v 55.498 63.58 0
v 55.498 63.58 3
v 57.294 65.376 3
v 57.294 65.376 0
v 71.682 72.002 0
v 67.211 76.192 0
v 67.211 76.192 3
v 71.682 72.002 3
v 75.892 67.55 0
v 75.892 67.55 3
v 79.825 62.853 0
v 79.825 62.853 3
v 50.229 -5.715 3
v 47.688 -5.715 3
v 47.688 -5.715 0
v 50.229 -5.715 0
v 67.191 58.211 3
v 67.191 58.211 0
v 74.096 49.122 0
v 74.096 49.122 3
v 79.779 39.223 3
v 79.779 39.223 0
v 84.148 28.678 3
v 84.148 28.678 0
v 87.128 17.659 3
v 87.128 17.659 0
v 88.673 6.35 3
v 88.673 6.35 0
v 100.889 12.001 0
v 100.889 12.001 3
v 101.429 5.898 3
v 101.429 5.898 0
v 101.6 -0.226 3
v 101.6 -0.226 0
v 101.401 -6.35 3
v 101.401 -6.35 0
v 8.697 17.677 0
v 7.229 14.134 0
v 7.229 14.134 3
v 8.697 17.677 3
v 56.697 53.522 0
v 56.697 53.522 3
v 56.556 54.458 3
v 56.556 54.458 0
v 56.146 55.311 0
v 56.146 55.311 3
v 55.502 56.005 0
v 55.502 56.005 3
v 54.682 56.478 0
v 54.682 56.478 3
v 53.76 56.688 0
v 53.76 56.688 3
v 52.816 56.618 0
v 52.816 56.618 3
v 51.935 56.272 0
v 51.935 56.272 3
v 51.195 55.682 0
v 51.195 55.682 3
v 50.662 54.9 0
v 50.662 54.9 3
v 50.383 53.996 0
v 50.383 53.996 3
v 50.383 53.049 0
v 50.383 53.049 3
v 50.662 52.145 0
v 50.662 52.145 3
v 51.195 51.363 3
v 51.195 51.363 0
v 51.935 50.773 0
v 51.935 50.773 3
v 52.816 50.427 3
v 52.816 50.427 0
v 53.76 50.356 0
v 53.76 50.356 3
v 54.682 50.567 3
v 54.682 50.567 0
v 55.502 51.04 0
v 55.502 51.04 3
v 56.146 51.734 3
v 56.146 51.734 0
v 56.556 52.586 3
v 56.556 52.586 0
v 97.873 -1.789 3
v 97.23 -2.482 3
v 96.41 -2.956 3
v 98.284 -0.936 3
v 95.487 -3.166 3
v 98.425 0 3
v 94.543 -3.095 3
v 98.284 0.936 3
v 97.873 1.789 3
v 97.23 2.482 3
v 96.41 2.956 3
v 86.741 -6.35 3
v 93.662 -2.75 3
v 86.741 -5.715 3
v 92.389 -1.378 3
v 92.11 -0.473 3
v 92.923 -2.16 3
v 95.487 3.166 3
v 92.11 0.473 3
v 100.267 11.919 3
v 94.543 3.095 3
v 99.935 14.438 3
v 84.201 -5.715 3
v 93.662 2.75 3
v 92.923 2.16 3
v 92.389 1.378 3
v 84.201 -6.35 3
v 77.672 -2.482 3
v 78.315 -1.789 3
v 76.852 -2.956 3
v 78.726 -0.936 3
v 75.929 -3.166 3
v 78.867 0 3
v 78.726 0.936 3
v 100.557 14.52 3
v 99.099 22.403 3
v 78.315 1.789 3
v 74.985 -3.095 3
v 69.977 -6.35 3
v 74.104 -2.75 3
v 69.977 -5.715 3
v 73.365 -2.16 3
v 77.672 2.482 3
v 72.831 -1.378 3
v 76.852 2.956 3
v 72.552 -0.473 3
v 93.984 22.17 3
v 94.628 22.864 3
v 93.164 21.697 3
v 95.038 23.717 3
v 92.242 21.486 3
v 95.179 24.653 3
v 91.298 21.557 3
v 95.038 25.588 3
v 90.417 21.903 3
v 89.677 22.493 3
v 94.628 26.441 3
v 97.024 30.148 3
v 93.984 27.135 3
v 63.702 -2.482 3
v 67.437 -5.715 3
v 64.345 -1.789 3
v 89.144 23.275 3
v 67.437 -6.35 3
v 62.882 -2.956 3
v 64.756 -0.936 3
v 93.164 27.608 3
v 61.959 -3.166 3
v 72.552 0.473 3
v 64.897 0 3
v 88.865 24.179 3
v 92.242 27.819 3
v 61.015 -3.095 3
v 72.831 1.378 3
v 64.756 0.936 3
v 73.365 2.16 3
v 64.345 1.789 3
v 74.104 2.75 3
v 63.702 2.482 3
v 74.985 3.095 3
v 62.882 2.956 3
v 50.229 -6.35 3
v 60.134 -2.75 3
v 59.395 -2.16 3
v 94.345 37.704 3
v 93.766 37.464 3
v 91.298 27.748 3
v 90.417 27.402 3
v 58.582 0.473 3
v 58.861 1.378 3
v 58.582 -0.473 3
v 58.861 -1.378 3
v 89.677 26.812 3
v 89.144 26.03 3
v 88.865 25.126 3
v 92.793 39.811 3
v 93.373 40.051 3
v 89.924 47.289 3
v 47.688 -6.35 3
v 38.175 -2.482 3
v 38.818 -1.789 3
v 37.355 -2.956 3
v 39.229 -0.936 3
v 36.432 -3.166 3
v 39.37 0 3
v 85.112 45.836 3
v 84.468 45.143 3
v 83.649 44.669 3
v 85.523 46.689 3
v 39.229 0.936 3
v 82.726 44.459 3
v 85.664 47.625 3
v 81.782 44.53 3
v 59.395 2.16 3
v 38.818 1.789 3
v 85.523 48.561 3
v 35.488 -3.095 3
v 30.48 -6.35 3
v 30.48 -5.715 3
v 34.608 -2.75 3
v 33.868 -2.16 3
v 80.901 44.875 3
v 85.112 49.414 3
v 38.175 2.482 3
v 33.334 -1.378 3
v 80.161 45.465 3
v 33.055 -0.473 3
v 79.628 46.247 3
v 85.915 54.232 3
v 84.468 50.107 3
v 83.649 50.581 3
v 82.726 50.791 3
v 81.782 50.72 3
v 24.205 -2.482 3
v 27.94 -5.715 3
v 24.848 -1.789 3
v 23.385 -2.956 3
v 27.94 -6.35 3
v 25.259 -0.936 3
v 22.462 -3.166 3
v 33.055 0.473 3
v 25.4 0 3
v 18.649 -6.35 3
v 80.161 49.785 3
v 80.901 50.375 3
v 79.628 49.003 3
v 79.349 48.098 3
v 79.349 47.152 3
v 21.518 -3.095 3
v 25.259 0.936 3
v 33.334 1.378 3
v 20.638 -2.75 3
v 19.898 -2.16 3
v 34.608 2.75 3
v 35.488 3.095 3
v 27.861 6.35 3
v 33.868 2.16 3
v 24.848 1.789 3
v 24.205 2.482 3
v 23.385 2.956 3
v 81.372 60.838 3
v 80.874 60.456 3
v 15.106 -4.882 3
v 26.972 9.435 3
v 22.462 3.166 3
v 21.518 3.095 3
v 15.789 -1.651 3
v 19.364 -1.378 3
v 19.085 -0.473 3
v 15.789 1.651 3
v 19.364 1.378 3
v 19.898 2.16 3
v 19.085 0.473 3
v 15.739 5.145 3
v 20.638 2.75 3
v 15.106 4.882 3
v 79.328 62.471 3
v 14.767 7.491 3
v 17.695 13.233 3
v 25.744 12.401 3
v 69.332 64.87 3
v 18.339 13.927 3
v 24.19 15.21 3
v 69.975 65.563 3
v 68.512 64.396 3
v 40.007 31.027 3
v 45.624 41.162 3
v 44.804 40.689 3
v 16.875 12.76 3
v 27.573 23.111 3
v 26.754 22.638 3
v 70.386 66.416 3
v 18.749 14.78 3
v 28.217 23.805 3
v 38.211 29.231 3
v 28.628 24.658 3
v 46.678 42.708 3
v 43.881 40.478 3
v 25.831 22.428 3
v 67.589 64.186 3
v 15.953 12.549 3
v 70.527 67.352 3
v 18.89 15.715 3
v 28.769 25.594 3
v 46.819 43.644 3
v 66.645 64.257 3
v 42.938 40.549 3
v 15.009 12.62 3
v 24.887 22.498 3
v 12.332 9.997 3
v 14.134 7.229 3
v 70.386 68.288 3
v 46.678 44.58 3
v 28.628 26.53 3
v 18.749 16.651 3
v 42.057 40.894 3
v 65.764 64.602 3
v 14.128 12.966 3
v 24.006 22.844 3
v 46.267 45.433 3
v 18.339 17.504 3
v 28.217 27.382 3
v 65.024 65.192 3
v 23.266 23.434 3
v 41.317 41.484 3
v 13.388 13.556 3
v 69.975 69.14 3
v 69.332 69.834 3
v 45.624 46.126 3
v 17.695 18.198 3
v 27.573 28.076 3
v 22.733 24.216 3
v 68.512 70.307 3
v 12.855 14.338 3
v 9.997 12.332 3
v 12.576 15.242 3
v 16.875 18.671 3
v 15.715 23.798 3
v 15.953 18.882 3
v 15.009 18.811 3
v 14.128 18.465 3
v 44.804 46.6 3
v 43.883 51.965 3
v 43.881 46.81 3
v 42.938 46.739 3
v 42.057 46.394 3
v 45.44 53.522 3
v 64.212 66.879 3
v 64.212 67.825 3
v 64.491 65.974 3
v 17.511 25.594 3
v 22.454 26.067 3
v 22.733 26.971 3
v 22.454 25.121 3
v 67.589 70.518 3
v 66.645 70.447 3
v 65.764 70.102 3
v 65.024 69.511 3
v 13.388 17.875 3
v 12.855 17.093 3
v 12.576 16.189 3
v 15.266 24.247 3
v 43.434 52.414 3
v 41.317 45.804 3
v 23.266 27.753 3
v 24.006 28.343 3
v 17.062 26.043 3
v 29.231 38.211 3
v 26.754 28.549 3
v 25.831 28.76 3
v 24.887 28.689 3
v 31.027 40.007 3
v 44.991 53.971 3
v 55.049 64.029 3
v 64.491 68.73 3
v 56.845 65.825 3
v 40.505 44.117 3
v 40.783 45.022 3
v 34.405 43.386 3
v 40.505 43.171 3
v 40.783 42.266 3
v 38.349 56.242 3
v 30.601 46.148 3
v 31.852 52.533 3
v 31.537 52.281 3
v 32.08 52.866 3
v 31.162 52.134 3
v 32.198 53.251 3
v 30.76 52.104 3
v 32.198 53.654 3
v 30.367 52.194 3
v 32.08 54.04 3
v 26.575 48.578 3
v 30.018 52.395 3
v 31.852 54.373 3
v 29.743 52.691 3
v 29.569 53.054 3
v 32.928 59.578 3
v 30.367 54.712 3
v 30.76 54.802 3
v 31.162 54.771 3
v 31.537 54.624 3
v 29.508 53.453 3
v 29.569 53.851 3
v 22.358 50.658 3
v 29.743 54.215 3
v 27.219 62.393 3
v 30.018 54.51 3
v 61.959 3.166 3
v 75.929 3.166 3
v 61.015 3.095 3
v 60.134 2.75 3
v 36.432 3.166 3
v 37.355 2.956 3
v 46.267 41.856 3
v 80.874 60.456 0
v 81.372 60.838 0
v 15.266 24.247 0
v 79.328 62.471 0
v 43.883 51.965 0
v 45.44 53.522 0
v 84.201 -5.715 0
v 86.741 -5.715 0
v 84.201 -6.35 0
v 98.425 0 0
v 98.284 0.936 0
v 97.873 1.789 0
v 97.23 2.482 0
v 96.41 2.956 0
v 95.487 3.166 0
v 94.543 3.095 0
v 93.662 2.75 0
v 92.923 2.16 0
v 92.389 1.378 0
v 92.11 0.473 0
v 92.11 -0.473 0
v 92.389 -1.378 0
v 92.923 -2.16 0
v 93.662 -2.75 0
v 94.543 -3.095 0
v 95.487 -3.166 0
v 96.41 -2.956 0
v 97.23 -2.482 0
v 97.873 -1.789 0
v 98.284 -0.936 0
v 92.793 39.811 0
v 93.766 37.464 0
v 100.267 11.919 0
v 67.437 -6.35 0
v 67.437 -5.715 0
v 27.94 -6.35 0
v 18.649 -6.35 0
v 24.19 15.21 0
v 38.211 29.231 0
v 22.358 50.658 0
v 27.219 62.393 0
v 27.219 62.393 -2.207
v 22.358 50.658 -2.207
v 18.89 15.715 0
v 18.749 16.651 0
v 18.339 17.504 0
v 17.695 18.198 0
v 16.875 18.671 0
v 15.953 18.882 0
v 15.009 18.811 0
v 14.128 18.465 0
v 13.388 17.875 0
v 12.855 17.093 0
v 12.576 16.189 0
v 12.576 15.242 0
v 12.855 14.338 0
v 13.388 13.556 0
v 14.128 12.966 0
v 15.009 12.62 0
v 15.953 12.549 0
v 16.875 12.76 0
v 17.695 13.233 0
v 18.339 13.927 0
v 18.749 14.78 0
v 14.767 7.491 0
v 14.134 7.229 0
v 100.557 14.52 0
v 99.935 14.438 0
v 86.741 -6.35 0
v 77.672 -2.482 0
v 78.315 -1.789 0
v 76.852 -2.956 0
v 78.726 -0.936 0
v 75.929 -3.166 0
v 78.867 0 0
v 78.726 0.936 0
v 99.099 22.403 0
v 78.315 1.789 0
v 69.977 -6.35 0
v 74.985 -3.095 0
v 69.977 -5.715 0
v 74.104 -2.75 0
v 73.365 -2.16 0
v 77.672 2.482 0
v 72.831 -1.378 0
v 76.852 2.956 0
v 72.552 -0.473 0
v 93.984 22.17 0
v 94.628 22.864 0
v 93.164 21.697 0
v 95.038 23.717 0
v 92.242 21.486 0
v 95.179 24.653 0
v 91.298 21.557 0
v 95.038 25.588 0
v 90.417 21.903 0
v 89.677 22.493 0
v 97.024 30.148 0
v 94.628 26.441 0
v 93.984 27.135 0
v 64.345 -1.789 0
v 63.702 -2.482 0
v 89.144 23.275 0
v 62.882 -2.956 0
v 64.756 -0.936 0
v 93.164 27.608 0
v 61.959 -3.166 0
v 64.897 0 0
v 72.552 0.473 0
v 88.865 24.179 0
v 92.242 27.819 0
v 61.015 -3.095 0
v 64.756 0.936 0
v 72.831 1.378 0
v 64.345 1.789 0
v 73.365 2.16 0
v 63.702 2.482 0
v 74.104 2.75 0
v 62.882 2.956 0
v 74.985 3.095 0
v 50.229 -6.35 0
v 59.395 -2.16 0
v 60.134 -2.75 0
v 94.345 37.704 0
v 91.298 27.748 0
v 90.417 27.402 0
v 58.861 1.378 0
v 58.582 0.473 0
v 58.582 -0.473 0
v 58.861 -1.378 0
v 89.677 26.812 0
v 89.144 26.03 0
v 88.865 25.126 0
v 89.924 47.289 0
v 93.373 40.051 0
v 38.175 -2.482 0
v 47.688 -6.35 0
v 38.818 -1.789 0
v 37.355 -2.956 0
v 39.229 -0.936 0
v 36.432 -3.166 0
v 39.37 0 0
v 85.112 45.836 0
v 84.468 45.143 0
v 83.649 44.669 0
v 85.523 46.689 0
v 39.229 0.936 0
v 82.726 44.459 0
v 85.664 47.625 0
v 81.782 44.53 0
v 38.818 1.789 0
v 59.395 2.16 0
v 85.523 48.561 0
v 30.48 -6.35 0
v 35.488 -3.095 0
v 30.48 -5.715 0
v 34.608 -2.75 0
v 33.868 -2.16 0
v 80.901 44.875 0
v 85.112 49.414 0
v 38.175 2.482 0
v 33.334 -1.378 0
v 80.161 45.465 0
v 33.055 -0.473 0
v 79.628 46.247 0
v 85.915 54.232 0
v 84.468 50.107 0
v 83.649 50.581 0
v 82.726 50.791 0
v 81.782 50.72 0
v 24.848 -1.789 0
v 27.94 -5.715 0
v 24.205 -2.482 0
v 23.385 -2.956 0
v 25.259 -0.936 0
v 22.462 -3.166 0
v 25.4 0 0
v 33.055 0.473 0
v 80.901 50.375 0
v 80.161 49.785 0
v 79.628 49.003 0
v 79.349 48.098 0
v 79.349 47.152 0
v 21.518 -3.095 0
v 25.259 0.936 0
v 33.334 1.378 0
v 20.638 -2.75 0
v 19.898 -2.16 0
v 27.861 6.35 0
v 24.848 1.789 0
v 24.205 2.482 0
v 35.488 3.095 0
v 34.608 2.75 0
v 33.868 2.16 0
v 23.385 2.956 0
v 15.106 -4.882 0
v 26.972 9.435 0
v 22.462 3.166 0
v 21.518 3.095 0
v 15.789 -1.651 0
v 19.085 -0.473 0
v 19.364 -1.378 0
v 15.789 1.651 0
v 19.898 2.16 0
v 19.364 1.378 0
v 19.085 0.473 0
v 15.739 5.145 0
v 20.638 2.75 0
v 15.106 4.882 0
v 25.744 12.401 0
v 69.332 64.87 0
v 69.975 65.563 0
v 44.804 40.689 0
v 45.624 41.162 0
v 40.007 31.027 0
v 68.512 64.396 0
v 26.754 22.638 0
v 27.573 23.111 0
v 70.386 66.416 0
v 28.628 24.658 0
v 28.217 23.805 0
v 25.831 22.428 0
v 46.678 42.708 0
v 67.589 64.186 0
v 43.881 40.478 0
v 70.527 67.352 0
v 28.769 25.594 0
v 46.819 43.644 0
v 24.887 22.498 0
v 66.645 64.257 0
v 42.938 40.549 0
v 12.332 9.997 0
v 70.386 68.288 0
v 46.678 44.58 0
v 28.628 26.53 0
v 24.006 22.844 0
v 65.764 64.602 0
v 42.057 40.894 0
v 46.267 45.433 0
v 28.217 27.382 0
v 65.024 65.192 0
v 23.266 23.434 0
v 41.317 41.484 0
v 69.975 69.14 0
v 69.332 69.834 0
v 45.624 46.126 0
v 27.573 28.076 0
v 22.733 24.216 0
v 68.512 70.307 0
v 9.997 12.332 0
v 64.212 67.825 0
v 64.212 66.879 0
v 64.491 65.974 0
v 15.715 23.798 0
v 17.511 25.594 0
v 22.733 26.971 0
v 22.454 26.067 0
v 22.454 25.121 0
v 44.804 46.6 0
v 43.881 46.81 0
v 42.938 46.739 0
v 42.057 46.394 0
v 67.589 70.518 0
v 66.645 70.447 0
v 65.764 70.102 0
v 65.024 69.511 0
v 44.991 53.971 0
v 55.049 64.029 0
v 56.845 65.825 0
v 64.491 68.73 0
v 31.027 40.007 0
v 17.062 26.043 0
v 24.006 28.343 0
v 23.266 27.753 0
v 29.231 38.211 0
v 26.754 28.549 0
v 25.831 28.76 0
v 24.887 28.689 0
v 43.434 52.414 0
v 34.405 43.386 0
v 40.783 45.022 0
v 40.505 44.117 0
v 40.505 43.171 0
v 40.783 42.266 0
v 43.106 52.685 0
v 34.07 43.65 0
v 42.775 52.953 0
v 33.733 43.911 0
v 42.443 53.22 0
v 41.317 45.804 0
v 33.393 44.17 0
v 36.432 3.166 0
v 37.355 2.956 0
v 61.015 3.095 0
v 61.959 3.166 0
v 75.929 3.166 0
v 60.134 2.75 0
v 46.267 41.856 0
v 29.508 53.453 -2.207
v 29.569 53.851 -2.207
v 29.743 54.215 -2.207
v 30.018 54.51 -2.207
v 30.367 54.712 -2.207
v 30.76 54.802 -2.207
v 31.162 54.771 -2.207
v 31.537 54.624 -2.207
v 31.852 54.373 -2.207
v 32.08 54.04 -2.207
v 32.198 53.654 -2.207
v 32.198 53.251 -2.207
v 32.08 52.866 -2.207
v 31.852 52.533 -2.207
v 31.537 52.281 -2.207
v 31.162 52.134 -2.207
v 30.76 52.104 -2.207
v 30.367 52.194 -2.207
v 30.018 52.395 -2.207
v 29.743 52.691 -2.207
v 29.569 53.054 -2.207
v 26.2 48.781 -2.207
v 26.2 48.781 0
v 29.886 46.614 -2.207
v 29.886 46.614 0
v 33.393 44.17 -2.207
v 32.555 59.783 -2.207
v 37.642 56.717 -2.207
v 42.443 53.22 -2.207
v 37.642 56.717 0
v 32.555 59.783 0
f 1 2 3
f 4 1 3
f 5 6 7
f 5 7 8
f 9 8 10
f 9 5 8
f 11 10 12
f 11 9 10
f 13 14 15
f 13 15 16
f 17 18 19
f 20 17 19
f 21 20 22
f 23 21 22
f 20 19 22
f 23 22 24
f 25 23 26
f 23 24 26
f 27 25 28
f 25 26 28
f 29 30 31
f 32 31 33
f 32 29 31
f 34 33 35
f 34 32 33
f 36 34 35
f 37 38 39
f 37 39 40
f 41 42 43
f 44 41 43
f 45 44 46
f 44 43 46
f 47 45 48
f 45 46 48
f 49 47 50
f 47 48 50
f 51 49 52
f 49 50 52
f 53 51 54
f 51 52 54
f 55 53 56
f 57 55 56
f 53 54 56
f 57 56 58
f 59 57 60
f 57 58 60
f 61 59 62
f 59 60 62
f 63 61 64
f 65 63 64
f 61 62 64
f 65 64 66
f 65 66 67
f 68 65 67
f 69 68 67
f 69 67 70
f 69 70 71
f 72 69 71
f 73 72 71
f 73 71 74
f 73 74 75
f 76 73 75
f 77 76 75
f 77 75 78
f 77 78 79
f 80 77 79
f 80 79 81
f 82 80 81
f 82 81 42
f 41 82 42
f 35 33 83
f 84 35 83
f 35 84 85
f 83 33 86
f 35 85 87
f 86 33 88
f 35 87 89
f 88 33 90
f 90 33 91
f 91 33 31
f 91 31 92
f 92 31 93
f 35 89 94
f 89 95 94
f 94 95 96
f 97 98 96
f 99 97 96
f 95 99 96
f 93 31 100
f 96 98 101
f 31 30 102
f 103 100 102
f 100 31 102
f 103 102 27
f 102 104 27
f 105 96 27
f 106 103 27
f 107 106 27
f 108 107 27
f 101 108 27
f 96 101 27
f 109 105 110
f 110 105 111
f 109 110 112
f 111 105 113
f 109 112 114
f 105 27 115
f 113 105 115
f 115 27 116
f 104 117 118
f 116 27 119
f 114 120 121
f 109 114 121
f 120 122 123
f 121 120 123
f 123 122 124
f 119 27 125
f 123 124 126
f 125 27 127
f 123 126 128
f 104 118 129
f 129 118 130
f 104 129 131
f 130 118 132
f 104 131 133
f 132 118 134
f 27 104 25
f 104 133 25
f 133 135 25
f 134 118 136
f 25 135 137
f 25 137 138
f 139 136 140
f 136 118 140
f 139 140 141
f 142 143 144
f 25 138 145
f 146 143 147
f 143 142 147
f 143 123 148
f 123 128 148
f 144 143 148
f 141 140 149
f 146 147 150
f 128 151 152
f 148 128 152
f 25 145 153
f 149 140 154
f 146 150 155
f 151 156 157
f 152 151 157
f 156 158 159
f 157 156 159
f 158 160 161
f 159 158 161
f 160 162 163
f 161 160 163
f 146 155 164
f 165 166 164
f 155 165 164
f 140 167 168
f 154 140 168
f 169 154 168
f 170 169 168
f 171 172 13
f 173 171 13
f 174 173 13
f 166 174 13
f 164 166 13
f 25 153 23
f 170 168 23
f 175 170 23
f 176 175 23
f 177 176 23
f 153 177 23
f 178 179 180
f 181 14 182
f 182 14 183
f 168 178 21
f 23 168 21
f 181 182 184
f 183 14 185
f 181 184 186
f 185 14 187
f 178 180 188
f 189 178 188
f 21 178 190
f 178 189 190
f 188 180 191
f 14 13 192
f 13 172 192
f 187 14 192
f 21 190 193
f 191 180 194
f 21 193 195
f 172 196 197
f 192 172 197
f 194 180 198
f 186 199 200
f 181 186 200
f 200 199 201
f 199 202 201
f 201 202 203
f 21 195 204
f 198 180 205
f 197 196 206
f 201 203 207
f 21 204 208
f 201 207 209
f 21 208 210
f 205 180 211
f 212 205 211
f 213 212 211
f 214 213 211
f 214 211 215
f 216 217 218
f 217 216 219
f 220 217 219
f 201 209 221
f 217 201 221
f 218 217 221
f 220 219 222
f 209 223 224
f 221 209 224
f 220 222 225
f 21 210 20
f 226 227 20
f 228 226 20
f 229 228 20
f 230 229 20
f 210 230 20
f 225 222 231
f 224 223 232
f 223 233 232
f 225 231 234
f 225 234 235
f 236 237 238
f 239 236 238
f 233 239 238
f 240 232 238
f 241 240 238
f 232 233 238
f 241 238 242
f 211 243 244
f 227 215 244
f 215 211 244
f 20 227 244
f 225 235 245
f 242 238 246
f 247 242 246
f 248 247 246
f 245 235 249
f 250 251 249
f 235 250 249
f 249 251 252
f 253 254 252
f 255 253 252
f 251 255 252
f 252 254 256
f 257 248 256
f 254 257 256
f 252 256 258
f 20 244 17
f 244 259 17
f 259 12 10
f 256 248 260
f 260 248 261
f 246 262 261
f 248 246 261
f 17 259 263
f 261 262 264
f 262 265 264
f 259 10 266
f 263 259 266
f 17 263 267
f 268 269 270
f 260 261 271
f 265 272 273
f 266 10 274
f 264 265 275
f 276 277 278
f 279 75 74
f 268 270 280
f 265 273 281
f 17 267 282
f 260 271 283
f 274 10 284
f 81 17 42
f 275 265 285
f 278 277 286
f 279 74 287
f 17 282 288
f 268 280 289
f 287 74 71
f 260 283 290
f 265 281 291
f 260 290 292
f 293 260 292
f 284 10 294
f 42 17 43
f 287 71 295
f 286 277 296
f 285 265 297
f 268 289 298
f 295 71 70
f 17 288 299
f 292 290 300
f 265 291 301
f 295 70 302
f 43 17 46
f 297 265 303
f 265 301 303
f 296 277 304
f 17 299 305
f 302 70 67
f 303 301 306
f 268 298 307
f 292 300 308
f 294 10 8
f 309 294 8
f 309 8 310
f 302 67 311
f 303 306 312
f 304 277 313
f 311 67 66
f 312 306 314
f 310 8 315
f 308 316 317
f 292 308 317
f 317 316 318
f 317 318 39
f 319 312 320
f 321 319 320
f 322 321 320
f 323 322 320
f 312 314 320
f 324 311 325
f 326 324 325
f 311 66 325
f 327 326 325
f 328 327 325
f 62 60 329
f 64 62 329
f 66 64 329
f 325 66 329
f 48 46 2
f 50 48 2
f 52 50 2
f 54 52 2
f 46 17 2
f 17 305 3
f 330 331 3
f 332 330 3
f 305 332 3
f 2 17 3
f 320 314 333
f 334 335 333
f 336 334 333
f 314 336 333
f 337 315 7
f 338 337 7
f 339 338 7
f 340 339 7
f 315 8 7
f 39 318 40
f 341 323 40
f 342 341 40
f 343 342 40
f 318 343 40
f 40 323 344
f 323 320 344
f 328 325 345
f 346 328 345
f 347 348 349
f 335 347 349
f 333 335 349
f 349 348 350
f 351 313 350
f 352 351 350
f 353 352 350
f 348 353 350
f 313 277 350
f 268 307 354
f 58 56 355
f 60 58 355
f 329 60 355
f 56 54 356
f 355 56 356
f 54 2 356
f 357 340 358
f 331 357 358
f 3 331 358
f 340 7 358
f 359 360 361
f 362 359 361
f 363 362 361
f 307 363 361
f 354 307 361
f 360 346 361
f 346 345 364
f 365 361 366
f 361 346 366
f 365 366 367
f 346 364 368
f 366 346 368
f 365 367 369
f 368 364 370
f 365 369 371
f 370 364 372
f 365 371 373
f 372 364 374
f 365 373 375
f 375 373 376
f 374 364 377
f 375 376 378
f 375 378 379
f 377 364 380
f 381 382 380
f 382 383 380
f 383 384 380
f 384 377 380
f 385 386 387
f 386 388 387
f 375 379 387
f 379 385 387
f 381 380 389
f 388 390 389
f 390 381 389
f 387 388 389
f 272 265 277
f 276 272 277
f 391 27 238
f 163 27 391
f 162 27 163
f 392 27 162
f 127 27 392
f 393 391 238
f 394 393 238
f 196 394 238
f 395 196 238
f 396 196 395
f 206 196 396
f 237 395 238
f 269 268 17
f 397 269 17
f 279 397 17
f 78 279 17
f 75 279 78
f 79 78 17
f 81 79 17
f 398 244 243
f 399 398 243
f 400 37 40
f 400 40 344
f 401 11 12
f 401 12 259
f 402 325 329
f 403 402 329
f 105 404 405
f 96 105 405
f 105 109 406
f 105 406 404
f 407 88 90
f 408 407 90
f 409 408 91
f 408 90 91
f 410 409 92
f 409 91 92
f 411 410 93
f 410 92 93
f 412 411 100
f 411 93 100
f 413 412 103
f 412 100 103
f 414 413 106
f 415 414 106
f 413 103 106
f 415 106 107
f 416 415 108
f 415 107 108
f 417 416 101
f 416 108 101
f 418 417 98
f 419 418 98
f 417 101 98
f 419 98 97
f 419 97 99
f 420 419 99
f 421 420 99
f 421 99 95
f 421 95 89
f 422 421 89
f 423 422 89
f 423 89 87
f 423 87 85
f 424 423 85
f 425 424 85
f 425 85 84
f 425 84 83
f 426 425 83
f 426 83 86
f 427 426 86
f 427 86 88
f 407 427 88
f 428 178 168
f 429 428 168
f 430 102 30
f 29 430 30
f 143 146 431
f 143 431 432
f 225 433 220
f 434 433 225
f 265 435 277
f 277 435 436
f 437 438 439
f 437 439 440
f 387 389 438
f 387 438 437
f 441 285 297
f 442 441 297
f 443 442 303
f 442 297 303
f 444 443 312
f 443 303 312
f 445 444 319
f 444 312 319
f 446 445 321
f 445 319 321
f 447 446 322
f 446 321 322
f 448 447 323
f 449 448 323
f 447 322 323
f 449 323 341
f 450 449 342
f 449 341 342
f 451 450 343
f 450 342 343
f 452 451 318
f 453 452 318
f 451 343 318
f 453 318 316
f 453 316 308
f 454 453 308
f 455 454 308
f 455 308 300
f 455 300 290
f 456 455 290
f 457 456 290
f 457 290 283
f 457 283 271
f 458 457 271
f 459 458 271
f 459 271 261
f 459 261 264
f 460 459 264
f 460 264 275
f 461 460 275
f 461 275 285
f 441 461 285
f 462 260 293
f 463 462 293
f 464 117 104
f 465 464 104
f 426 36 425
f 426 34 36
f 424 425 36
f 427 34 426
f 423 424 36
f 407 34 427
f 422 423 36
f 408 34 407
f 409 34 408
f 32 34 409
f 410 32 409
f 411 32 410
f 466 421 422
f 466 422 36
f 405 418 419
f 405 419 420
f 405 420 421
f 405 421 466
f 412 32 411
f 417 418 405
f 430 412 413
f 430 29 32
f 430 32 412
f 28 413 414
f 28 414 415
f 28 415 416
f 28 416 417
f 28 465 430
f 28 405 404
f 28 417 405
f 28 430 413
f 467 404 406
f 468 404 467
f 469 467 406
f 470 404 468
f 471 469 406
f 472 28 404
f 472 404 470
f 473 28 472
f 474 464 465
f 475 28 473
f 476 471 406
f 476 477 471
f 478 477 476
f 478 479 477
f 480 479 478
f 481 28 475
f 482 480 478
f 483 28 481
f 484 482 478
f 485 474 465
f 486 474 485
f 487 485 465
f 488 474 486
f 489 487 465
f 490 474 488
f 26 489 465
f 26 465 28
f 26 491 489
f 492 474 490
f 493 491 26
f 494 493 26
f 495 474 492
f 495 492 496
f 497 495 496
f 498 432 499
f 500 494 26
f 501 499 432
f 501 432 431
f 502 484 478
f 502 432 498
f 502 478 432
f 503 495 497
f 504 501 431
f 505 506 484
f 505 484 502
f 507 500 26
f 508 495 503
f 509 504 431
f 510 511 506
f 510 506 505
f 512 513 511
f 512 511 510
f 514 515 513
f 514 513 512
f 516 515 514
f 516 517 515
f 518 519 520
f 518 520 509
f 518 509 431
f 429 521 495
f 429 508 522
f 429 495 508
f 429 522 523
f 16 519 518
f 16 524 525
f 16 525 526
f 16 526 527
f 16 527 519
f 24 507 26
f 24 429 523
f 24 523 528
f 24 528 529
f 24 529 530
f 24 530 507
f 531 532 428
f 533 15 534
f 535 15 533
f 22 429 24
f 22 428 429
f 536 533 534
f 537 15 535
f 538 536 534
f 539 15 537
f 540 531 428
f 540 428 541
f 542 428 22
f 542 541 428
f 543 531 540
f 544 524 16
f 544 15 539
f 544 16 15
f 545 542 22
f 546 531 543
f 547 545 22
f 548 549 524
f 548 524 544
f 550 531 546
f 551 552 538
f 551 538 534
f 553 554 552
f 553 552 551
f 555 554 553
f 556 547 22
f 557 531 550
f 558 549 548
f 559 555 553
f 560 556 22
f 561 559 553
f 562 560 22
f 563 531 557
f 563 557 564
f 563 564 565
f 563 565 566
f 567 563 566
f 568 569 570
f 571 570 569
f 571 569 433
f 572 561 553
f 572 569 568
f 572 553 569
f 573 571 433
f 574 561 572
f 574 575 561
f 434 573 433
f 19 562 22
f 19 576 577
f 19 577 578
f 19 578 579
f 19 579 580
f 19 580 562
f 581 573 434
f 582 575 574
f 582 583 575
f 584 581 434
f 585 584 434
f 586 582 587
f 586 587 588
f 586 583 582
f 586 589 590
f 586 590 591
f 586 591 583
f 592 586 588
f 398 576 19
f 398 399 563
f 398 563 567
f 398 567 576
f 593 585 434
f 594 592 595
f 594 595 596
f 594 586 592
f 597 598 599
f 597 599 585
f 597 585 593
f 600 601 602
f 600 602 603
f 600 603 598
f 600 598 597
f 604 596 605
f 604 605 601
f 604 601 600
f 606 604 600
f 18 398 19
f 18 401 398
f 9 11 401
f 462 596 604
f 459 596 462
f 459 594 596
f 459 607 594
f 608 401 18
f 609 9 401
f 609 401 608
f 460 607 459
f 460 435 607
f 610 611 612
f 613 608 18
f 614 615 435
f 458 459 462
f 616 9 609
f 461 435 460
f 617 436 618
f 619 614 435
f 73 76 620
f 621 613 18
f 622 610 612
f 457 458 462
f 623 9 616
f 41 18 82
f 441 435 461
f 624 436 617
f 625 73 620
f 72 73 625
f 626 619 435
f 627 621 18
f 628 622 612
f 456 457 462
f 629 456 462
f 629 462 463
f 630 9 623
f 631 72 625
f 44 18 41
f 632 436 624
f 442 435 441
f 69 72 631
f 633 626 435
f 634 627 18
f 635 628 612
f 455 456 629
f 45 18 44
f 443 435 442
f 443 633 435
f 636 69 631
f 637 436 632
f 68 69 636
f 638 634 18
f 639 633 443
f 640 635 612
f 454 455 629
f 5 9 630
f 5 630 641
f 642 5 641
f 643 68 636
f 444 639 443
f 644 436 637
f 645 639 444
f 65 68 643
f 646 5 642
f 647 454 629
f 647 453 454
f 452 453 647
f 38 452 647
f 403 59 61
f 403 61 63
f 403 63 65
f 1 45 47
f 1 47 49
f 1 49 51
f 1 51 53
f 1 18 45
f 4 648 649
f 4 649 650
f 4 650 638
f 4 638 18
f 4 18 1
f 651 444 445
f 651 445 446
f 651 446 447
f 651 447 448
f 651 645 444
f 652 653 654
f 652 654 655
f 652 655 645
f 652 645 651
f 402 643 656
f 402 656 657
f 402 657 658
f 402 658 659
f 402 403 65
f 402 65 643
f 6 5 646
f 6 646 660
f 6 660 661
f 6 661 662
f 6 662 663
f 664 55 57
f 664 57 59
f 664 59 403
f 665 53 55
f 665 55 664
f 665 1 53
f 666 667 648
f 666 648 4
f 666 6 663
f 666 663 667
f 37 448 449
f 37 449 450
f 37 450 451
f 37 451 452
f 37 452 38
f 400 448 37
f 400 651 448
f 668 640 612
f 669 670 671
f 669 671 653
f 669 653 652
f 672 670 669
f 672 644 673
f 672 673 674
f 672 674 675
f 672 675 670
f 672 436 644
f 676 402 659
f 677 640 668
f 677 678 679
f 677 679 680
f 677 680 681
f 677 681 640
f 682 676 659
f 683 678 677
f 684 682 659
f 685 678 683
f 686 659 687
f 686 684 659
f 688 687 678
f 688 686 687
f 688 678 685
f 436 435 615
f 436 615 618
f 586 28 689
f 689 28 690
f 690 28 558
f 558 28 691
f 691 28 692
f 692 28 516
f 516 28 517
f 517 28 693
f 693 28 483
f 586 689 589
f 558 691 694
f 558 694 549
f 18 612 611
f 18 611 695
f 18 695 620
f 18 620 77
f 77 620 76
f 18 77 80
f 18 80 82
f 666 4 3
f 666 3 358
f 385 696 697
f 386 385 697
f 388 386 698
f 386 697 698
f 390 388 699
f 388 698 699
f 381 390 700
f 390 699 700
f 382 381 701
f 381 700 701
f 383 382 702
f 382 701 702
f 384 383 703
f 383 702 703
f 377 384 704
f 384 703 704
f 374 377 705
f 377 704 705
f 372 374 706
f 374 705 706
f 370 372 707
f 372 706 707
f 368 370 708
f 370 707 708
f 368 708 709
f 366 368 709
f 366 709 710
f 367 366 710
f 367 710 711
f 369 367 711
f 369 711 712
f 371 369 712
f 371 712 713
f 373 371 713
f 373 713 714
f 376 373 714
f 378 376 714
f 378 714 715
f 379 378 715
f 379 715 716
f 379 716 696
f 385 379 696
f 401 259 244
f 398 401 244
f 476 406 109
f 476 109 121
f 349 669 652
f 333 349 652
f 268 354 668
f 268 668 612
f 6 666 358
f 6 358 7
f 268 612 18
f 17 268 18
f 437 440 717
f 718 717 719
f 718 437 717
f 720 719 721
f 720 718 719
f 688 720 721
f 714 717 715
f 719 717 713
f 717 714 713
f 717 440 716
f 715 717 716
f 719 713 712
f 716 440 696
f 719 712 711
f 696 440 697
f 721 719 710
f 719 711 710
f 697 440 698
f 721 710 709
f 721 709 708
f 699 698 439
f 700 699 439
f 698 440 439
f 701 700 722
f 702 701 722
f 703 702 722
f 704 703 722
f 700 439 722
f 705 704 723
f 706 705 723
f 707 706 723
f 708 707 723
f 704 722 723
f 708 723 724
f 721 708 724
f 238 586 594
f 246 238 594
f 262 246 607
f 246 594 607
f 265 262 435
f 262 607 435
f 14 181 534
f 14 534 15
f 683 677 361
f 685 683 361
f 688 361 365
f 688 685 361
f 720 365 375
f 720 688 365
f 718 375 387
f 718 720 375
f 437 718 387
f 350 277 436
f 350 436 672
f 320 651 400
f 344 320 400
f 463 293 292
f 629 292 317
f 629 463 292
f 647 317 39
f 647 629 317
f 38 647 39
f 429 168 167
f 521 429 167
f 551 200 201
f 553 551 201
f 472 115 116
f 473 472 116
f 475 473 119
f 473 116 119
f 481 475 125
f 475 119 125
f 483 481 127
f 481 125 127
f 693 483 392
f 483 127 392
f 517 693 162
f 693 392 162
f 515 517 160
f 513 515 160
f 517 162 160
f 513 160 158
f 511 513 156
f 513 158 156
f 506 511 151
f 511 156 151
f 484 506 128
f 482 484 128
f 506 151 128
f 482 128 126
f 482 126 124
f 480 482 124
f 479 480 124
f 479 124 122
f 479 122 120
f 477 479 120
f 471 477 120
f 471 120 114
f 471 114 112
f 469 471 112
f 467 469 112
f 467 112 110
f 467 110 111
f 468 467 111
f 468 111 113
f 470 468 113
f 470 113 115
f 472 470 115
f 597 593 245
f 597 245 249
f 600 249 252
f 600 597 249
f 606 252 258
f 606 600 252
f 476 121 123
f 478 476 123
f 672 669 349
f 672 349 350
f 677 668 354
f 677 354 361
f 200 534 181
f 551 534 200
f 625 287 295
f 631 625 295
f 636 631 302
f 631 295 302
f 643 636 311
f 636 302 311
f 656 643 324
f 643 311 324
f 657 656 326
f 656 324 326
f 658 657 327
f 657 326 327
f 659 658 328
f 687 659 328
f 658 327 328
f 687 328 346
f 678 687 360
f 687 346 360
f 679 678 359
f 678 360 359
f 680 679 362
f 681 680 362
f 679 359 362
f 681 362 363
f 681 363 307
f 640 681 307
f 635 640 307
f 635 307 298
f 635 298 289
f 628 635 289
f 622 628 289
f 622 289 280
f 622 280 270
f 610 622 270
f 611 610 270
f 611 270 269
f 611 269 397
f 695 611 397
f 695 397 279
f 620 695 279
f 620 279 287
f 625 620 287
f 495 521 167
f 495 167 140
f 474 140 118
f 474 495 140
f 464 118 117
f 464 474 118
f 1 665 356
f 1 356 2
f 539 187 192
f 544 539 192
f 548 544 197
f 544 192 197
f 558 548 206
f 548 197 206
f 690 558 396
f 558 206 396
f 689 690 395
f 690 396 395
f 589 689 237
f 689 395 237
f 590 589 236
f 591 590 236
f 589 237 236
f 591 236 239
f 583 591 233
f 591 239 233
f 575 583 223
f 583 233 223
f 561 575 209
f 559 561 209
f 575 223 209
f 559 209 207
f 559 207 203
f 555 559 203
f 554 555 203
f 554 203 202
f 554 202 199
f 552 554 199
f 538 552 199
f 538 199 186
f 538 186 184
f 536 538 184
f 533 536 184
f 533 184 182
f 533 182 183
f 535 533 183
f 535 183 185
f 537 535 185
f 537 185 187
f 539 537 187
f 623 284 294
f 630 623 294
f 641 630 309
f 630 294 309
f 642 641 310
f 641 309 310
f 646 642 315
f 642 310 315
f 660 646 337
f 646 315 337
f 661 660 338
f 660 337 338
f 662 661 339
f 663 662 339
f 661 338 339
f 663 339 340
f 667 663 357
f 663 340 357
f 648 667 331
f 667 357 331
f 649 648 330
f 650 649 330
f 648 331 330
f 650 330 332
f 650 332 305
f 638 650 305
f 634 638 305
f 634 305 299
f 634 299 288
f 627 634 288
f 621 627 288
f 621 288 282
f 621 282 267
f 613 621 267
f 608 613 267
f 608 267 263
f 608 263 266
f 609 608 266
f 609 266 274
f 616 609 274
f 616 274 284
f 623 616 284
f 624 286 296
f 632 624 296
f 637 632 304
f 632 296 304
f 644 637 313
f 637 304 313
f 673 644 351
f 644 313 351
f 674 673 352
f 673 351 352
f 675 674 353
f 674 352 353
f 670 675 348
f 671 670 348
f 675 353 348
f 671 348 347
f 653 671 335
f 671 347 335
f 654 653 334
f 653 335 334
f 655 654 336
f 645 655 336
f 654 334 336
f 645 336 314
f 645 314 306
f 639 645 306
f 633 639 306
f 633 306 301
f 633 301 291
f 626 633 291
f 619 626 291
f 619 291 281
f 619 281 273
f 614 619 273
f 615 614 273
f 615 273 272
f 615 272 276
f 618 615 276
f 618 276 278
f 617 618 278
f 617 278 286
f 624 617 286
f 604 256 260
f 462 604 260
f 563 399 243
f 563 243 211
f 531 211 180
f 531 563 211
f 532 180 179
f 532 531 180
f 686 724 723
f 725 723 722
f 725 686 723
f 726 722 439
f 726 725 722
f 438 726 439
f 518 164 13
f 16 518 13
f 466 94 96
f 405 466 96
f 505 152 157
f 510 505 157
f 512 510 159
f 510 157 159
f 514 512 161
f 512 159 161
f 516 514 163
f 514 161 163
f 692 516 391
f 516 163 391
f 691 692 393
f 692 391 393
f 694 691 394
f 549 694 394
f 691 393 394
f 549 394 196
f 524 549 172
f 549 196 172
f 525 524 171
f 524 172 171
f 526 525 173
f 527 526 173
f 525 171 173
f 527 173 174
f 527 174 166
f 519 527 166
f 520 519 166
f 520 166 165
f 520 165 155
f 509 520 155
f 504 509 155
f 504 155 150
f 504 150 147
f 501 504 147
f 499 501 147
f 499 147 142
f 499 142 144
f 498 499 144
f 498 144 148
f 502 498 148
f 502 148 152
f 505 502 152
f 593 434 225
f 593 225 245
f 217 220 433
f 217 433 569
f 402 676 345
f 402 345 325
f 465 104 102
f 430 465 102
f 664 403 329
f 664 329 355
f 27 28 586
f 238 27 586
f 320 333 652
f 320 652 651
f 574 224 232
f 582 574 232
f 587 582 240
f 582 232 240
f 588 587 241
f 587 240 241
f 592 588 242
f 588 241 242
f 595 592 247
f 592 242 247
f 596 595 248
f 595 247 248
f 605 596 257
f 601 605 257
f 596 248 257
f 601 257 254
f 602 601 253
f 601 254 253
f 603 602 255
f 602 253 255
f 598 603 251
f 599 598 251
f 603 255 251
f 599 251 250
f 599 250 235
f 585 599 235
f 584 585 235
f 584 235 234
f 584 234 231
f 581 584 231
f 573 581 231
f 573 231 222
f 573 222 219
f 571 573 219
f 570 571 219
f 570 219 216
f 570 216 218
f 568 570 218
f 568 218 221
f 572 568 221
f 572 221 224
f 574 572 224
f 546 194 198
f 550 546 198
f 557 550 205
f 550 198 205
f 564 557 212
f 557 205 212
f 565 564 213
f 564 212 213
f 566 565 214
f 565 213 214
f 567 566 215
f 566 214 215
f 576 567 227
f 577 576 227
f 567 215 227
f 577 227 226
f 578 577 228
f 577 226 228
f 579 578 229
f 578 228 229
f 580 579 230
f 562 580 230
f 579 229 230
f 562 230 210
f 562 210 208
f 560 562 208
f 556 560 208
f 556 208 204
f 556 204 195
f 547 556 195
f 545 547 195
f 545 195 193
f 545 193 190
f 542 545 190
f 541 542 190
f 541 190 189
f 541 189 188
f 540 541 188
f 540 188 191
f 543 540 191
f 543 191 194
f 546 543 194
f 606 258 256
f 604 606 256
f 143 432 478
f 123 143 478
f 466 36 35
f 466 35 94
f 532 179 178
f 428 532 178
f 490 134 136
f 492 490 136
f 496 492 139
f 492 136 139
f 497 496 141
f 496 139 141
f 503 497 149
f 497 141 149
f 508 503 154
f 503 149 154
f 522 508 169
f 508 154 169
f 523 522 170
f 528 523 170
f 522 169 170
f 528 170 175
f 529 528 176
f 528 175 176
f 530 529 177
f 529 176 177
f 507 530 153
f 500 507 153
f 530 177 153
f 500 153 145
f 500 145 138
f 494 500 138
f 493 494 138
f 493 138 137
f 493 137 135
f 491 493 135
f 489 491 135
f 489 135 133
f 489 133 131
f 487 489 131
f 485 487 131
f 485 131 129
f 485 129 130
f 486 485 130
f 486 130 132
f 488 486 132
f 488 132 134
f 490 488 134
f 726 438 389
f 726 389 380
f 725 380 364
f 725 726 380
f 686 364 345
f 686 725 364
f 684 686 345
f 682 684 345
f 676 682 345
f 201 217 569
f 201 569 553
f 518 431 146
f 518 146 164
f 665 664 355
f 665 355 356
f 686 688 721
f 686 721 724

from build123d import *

# Parameters (mm, degrees)
BOSS_EXTRUDE1_DEPTH   = 3.000000096
SKETCH2_R             = 3.175
CUT_EXTRUDE1_DEPTH    = 4.000000096
SKETCH3_W             = 2.54
SKETCH3_H             = 0.635
CUT_EXTRUDE2_DEPTH    = 4.000000096
BOSS_EXTRUDE2_DEPTH   = 2.206999904
F_6_32_TAPPED_HOLE1_D = 2.7051


with BuildPart() as part:
    # Sketch1 → Boss-Extrude1 (new body)
    with BuildSketch(Plane.XY):
        with BuildLine():
            Line((22.357699804, 50.65759216), (27.218819563, 62.393373411))
            ThreePointArc((27.218819563, 62.393373411), (35.677104191, 57.973626939), (43.43415954, 52.414415661))
            Line((43.43415954, 52.414415661), (67.21146711, 76.191723231))
            ThreePointArc((67.21146711, 76.191723231), (93.866160503, 38.880636728), (101.401368334, -6.35))
            Line((101.401368334, -6.35), (18.648926052, -6.35))
            Line((18.648926052, -6.35), (15.105587123, -4.88230096))
            ThreePointArc((15.105587123, -4.88230096), (14.666587579, 6.075099489), (7.228954972, 14.133571205))
            Line((7.228954972, 14.133571205), (8.696654013, 17.676910134))
            Line((8.696654013, 17.676910134), (34.405475059, 43.38573118))
            ThreePointArc((34.405475059, 43.38573118), (28.61353693, 47.405947816), (22.357699804, 50.65759216))
        make_face()
        with BuildLine():
            Line((88.672924278, 6.35), (27.86051193, 6.35))
            ThreePointArc((27.86051193, 6.35), (26.399857642, 10.93517908), (24.190484974, 15.210228852))
            Line((24.190484974, 15.210228852), (67.191354125, 58.211098004))
            ThreePointArc((67.191354125, 58.211098004), (82.13289044, 34.020557137), (88.672924278, 6.35))
        make_face(mode=Mode.SUBTRACT)
    extrude(amount=BOSS_EXTRUDE1_DEPTH)

    # Sketch2 → Cut-Extrude1 (cut, through all)
    with BuildSketch(Plane.XY.offset(3.000000096)):
        with Locations((22.225, 0)):
            Circle(SKETCH2_R)
        with Locations((36.195, 0)):
            Circle(SKETCH2_R)
        with Locations((61.722, 0)):
            Circle(SKETCH2_R)
        with Locations((75.692, 0)):
            Circle(SKETCH2_R)
        with Locations((95.25, 0)):
            Circle(SKETCH2_R)
        with Locations((15.715448212, 15.715448212)):
            Circle(SKETCH2_R)
        with Locations((25.593729945, 25.593729945)):
            Circle(SKETCH2_R)
        with Locations((43.644044748, 43.644044748)):
            Circle(SKETCH2_R)
        with Locations((53.522326482, 53.522326482)):
            Circle(SKETCH2_R)
        with Locations((92.004434954, 24.652514046)):
            Circle(SKETCH2_R)
        with Locations((82.48891971, 47.625)):
            Circle(SKETCH2_R)
        with Locations((67.351920908, 67.351920908)):
            Circle(SKETCH2_R)
    extrude(amount=-CUT_EXTRUDE1_DEPTH, mode=Mode.SUBTRACT)

    # Sketch3 → Cut-Extrude2 (cut, through all)
    with BuildSketch(Plane.XY.offset(3.000000096)):
        Polygon((15.266435406, 24.246691527), (17.06248663, 26.042742751), (17.511499436, 25.593729945), (15.715448212, 23.797678721), align=None)
        Polygon((44.991083167, 53.971339288), (43.43415954, 52.414415661), (43.883172346, 51.965402855), (45.440095973, 53.522326482), align=None)
        with Locations((29.21, -6.0325)):
            Rectangle(SKETCH3_W, SKETCH3_H)
        with Locations((68.707, -6.0325)):
            Rectangle(SKETCH3_W, SKETCH3_H)
        Polygon((29.230733674, 38.210989795), (31.026784898, 40.007041019), (40.007041019, 31.026784898), (38.210989795, 29.230733674), align=None)
        Polygon((56.845021246, 65.825277367), (55.048970022, 64.029226143), (55.497982828, 63.580213337), (57.294034052, 65.376264561), align=None)
        with Locations((48.9585, -6.0325)):
            Rectangle(SKETCH3_W, SKETCH3_H)
        with Locations((85.471, -6.0325)):
            Rectangle(SKETCH3_W, SKETCH3_H)
        Polygon((99.935462164, 14.437711971), (100.266998693, 11.919442024), (101.526133667, 12.085210288), (101.194597138, 14.603480236), align=None)
        Polygon((93.765504959, 37.464305742), (94.938831965, 37.950313702), (93.966816047, 40.296967714), (92.793489041, 39.810959755), align=None)
        Polygon((79.327792988, 62.471156422), (80.874047017, 60.456038938), (81.88160576, 61.229165953), (80.33535173, 63.244283437), align=None)
        Polygon((13.593916116, 7.005422516), (14.565932035, 4.658768503), (15.739259041, 5.144776462), (14.767243123, 7.491430475), align=None)
    extrude(amount=-CUT_EXTRUDE2_DEPTH, mode=Mode.SUBTRACT)

    # Sketch4 → Boss-Extrude2 (add)
    with BuildSketch(Plane(origin=(0, 0, 0), x_dir=(-1, 0, 0), z_dir=(0, 0, -1))):
        with BuildLine():
            Line((-27.218819563, 62.393373411), (-22.357699804, 50.65759216))
            ThreePointArc((-22.357699804, 50.65759216), (-28.063600293, 47.73355971), (-33.393246405, 44.169553751))
            Line((-33.393246405, 44.169553751), (-42.443492672, 53.219800017))
            ThreePointArc((-42.443492672, 53.219800017), (-35.13186657, 58.305652688), (-27.218819563, 62.393373411))
        make_face()
    extrude(amount=BOSS_EXTRUDE2_DEPTH)

    # #6-32 Tapped Hole1 (through all)
    with Locations(Plane.XY.offset(3.000000096)):
        with Locations((30.861, 53.452819972)):
            Hole(F_6_32_TAPPED_HOLE1_D / 2)


solid = part.part
